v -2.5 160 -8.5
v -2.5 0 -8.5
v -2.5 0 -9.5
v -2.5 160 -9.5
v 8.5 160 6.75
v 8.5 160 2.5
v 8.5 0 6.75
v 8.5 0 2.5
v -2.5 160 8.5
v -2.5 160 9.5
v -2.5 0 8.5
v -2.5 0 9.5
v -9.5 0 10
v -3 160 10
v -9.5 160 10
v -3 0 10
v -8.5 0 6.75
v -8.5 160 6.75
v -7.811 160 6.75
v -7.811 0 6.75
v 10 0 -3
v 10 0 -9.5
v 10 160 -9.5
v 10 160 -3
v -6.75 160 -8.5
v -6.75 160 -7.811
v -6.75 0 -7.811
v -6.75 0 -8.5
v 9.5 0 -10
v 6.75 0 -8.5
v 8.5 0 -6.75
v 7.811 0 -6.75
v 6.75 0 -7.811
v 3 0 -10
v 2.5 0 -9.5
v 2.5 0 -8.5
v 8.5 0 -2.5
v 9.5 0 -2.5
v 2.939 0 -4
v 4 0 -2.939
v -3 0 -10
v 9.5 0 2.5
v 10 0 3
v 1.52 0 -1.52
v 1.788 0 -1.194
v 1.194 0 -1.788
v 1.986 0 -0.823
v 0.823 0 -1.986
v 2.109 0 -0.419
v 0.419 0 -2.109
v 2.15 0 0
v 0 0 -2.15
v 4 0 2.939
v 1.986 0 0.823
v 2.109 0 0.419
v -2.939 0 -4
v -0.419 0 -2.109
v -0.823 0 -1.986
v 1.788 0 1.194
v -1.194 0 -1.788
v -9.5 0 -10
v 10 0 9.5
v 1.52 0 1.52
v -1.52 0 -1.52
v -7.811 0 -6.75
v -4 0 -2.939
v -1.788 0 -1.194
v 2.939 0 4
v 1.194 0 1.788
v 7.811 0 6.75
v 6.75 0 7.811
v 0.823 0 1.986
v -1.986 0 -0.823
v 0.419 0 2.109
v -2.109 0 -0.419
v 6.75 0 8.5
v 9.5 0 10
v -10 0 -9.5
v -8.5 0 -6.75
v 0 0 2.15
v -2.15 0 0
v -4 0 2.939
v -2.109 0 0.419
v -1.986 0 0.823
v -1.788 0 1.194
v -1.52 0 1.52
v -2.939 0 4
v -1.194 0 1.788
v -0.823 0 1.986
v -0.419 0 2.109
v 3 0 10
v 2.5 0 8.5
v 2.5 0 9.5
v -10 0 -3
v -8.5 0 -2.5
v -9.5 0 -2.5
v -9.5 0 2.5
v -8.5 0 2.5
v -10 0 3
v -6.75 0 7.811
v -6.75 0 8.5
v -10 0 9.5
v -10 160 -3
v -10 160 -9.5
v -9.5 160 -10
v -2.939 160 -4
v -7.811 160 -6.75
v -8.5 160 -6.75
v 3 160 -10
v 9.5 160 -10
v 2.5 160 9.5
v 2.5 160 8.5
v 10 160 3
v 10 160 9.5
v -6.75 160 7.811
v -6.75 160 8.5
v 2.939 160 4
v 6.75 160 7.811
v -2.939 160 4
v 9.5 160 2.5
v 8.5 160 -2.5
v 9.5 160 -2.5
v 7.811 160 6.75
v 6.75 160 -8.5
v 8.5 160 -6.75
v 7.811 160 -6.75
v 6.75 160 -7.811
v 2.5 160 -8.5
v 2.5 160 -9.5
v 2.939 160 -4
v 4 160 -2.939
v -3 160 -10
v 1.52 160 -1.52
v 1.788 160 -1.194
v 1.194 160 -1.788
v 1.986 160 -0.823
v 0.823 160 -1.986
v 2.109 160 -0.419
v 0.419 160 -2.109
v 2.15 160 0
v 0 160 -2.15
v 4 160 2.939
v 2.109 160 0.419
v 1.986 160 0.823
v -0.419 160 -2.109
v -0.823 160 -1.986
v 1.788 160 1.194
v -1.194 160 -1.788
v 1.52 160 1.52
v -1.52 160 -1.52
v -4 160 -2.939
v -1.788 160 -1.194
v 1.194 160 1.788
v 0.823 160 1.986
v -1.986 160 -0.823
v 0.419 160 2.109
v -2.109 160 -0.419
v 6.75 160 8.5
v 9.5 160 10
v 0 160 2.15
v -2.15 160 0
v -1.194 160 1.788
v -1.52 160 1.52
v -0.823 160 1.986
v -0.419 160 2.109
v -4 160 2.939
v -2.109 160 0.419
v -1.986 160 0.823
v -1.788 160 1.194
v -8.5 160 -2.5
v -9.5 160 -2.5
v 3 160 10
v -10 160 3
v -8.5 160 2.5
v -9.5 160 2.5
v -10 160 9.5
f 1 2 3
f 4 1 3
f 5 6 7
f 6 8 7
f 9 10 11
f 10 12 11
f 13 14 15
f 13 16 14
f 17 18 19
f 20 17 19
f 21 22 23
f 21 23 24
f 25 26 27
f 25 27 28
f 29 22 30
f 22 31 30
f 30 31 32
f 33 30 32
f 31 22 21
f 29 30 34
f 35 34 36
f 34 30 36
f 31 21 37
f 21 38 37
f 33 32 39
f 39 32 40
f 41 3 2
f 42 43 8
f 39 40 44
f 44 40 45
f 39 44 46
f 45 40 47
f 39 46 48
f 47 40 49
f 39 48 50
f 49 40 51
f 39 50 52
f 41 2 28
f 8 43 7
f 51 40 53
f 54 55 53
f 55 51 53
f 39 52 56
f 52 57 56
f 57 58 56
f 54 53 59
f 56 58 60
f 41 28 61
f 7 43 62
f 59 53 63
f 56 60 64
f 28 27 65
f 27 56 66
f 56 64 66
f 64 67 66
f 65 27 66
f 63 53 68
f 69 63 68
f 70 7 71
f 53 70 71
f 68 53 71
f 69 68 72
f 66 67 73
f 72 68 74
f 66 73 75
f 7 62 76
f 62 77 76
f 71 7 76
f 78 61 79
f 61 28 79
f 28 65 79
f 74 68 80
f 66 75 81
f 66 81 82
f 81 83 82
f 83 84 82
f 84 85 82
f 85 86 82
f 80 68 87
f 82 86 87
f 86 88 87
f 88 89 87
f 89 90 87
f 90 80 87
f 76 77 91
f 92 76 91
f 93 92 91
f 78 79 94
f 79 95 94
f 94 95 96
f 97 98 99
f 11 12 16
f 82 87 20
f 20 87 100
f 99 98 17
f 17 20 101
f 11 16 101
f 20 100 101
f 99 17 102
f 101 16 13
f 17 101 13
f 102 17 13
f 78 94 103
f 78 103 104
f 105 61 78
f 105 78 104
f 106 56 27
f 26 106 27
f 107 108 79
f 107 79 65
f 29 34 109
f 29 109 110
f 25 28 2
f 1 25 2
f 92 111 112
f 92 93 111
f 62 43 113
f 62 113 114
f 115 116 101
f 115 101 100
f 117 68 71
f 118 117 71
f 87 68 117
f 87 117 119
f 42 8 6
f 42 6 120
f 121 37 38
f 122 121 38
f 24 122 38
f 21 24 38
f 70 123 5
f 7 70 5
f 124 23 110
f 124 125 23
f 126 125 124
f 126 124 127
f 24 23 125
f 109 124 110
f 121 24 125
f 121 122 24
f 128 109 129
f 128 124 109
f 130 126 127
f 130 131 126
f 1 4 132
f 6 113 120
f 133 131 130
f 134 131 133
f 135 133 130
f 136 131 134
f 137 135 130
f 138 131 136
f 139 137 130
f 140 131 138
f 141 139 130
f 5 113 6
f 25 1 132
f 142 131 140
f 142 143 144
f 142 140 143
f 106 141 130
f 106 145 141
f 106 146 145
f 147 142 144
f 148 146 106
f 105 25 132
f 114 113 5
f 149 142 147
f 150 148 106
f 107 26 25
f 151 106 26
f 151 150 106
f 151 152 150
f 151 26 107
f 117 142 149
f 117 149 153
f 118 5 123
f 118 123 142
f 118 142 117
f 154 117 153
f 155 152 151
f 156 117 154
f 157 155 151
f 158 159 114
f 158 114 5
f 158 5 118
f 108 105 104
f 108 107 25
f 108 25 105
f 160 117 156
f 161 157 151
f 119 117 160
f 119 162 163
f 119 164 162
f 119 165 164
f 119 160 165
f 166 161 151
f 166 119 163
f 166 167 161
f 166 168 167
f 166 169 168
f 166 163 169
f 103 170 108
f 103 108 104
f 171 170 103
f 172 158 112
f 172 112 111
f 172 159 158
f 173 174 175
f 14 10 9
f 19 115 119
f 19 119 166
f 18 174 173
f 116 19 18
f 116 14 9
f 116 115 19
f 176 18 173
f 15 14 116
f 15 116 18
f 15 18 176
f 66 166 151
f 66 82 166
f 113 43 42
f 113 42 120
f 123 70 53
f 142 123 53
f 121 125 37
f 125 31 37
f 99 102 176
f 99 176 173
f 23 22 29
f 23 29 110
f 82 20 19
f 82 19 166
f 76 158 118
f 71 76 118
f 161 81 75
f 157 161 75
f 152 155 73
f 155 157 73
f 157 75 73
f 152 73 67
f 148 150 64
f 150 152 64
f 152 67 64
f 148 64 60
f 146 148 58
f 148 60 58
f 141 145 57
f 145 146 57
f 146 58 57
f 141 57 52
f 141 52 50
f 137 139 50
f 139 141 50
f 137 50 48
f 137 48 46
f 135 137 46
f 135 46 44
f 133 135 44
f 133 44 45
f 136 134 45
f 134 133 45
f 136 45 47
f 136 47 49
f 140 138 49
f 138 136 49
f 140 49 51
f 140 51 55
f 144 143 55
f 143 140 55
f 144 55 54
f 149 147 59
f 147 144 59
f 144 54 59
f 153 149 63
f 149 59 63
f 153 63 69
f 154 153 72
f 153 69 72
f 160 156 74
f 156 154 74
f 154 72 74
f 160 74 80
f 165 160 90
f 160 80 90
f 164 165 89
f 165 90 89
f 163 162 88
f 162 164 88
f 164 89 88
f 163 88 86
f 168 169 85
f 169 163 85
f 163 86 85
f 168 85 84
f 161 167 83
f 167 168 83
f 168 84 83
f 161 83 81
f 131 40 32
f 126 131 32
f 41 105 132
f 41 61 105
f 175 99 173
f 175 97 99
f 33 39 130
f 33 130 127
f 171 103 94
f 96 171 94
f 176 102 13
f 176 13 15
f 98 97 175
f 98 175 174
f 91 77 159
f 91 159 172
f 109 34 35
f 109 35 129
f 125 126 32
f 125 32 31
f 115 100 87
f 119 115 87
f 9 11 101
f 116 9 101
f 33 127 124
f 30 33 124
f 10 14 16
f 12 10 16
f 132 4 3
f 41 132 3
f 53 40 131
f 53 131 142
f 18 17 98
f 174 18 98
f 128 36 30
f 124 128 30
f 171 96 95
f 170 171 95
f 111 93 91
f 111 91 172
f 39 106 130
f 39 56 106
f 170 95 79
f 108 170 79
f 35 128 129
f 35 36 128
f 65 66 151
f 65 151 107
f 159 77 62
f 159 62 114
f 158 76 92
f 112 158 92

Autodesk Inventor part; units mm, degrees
ref_plane "YZ Plane" through (0, 0, 0) normal (1, 0, 0) x (0, 1, 0)
ref_plane "XZ Plane" through (0, 0, 0) normal (0, 1, 0) x (-1, 0, 0)
ref_plane "XY Plane" through (0, 0, 0) normal (0, 0, 1) x (1, 0, 0)
sketch "Sketch1" plane through (0, 0, 0) normal (0, 1, 0) x (-1, 0, 0)
  line L0 (-2.9393, 4) -> (2.9393, 4)
  line L1 (4, 2.9393) -> (4, -2.9393)
  line L2 (2.9393, -4) -> (-2.9393, -4)
  line L3 (-4, -2.9393) -> (-4, 2.9393)
  circle A0 centre (0, 0) radius 2.15
  line L4 (-2.9393, 4) -> (-6.75, 7.8107)
  line L5 (-7.8107, 6.75) -> (-4, 2.9393)
  line L6 (4, -2.9393) -> (7.8107, -6.75)
  line L7 (-10, 10) -> (-2.5, 10)
  line L8 (2.5, 10) -> (10, 10)
  line L9 (10, -10) -> (2.5, -10)
  line L10 (-2.5, -10) -> (-10, -10)
  line L11 (10, 10) -> (10, 2.5)
  line L12 (10, -2.5) -> (10, -10)
  line L13 (-10, -10) -> (-10, -2.5)
  line L14 (-10, 2.5) -> (-10, 10)
  line L15 (-8.5, 2.5) -> (-8.5, 6.75)
  line L16 (-6.75, 8.5) -> (-2.5, 8.5)
  line L17 (2.5, 10) -> (2.5, 8.5)
  line L18 (10, 2.5) -> (8.5, 2.5)
  line L19 (10, -2.5) -> (8.5, -2.5)
  line L20 (2.5, -8.5) -> (2.5, -10)
  line L21 (-2.5, -8.5) -> (-2.5, -10)
  line L22 (-8.5, -2.5) -> (-10, -2.5)
  line L23 (-8.5, 2.5) -> (-10, 2.5)
  line L24 (-2.5, 10) -> (-2.5, 8.5)
  line L25 (-7.8107, 6.75) -> (-8.5, 6.75)
  line L26 (-6.75, 8.5) -> (-6.75, 7.8107)
  line L27 (6.75, 8.5) -> (6.75, 7.8107)
  line L28 (8.5, 6.75) -> (7.8107, 6.75)
  line L29 (8.5, 6.75) -> (8.5, 2.5)
  line L30 (2.5, 8.5) -> (6.75, 8.5)
  line L31 (6.75, 7.8107) -> (2.9393, 4)
  line L32 (7.8107, 6.75) -> (4, 2.9393)
  line L33 (2.9393, -4) -> (6.75, -7.8107)
  line L34 (8.5, -2.5) -> (8.5, -6.75)
  line L35 (6.75, -8.5) -> (2.5, -8.5)
  line L36 (8.5, -6.75) -> (7.8107, -6.75)
  line L37 (6.75, -7.8107) -> (6.75, -8.5)
  line L38 (-2.5, -8.5) -> (-6.75, -8.5)
  line L39 (-2.9393, -4) -> (-6.75, -7.8107)
  line L40 (-8.5, -6.75) -> (-8.5, -2.5)
  line L41 (-4, -2.9393) -> (-7.8107, -6.75)
  line L42 (-6.75, -7.8107) -> (-6.75, -8.5)
  line L43 (-7.8107, -6.75) -> (-8.5, -6.75)
  dimension "d0" = 20
  dimension "d1" = 20
  dimension "d26" = 1.5
  dimension "d27" = 1.5
  dimension "d32" = 7.5
  dimension "d33" = 5
  dimension "d34" = 7.5
  dimension "d35" = 7.5
  dimension "d40" = 6
  dimension "d41" = 13.5
extrude "Extrusion1" add sketch "Sketch1" along normal blind 160
chamfer "Chamfer1" distance 0.5 angle 45 12 edges at (-10, 80, 2.5) (-10, 80, -2.5) (-2.5, 80, 10) (2.5, 80, 10) (10, 80, 2.5) (10, 80, -2.5) (2.5, 80, -10) (-2.5, 80, -10) (-10, 80, 10) (-10, 80, -10) (10, 80, -10) (10, 80, 10)
properties part number "2020 Extrusion 160mm" material "Aluminum 6061"
